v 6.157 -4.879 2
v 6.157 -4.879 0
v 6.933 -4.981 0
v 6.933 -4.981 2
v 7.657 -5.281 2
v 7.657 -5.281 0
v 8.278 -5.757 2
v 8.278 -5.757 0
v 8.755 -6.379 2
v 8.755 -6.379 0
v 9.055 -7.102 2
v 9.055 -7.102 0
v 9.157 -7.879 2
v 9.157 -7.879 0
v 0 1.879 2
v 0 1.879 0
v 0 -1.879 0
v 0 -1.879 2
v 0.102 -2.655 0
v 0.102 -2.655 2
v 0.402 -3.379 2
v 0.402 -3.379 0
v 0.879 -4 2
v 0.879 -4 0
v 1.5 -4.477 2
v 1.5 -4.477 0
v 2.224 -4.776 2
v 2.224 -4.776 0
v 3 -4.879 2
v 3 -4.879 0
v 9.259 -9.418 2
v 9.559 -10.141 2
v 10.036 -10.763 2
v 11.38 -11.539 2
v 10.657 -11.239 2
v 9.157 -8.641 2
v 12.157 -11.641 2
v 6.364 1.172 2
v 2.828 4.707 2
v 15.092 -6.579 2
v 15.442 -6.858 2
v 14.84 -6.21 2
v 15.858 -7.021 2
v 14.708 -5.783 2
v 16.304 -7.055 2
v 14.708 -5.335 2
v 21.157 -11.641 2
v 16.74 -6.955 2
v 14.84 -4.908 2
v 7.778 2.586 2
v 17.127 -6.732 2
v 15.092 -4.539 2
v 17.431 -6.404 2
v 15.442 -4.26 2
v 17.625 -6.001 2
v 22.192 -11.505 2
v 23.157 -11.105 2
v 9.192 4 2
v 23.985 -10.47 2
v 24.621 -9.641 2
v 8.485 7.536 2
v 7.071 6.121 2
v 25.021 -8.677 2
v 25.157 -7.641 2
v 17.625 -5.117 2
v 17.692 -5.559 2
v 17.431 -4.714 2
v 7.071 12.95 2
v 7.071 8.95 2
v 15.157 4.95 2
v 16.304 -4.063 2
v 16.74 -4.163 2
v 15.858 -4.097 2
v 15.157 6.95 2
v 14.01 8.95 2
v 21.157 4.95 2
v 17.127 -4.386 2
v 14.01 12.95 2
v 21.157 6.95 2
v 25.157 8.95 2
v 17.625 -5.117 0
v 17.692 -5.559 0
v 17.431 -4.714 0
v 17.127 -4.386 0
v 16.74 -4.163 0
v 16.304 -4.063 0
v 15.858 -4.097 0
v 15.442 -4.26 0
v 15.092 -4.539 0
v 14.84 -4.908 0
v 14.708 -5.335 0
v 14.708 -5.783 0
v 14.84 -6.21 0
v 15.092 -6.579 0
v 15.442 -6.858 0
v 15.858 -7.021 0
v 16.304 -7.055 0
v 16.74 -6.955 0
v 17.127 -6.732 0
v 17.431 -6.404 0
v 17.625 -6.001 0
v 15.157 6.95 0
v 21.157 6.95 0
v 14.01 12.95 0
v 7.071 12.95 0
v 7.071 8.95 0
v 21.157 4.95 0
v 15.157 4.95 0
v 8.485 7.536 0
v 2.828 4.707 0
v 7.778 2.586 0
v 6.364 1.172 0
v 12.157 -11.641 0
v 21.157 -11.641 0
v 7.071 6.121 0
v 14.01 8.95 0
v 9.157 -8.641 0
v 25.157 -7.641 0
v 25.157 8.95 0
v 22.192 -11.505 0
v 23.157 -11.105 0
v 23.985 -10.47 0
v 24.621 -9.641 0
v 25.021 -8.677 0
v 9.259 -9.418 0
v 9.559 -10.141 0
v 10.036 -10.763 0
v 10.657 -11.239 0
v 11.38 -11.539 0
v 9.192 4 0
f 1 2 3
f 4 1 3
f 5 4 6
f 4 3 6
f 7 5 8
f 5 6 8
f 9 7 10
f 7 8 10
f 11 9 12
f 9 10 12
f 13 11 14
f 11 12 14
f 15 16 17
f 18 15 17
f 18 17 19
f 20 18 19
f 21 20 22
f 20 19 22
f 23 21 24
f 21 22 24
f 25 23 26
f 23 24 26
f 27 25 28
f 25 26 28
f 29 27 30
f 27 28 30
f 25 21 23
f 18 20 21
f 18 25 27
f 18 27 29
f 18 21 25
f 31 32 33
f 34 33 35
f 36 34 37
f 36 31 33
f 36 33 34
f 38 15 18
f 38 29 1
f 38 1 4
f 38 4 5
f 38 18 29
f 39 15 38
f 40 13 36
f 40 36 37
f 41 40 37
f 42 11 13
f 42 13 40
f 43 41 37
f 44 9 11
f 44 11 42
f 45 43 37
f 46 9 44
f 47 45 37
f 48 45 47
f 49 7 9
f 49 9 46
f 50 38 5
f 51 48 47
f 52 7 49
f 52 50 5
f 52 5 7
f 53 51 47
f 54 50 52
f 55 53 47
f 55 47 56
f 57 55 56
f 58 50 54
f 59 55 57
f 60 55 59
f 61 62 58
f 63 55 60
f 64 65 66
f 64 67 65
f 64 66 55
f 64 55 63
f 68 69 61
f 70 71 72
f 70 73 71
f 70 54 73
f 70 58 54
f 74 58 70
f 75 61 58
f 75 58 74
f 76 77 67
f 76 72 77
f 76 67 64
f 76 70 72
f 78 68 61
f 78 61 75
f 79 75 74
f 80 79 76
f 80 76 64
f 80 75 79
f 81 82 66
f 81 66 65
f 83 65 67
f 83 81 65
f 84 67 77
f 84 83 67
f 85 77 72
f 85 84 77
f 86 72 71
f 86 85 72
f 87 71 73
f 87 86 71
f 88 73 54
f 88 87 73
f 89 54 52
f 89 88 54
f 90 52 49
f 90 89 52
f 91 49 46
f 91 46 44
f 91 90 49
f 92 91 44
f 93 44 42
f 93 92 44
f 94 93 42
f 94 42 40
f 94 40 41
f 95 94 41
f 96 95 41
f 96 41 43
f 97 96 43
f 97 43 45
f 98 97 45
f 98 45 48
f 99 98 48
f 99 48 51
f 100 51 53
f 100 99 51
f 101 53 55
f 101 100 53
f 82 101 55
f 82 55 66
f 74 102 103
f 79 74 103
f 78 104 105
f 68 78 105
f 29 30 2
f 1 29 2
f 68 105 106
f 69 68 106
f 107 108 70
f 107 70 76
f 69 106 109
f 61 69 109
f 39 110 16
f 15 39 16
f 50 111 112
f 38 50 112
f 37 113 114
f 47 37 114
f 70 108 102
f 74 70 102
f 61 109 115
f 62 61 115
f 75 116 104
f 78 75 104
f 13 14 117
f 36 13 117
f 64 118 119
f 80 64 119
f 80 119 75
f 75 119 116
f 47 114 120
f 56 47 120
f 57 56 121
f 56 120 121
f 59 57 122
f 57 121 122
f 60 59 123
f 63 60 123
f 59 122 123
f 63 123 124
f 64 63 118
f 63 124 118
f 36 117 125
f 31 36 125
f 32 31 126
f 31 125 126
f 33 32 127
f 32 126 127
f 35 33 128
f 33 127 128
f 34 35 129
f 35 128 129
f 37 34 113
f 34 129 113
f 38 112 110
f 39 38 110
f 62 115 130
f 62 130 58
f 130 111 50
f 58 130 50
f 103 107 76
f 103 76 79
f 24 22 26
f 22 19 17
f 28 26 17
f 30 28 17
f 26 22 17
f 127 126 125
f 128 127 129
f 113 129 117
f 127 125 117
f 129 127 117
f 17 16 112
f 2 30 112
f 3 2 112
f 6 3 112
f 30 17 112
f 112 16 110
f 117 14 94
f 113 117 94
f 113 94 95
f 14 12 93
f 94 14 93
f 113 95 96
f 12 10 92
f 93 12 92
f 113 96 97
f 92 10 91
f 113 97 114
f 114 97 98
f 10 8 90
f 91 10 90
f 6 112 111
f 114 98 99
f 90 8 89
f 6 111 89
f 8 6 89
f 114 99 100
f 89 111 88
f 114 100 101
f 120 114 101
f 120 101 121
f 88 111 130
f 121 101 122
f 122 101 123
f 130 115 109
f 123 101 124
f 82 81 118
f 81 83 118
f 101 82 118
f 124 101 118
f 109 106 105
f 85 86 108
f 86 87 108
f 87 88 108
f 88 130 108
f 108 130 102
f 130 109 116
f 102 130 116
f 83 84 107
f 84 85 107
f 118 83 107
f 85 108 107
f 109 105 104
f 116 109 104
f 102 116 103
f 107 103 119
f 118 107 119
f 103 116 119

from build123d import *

# Parameters (mm, degrees)
MODEL_R             = 1.5
MODEL_W             = 6
MODEL_H             = 2
BOSS_EXTRUDE1_DEPTH = 2
SKETCH15_W          = 2
SKETCH15_H          = 3
CUT_EXTRUDE1_DEPTH  = 2


with BuildPart() as part:
    # Model → Boss-Extrude1 (new body)
    with BuildSketch(Plane.XY):
        with BuildLine():
            Line((6.363961031, 1.171572875), (2.828427125, 4.707106781))
            Line((2.828427125, 4.707106781), (0, 1.878679656))
            Line((0, 1.878679656), (0, -1.878679656))
            ThreePointArc((0, -1.878679656), (0.878679656, -4), (3, -4.878679656))
            Line((3, -4.878679656), (5.828427125, -4.878679656))
            Line((5.828427125, -4.878679656), (6.156854249, -4.878679656))
            ThreePointArc((6.156854249, -4.878679656), (8.278174593, -5.757359313), (9.156854249, -7.878679656))
            Line((9.156854249, -7.878679656), (9.156854249, -8.641362585))
            ThreePointArc((9.156854249, -8.641362585), (10.035533906, -10.762682929), (12.156854249, -11.641362585))
            Line((12.156854249, -11.641362585), (21.156854249, -11.641362585))
            ThreePointArc((21.156854249, -11.641362585), (23.985281374, -10.46978971), (25.156854249, -7.641362585))
            Line((25.156854249, -7.641362585), (25.156854249, 8.949747468))
            Line((25.156854249, 8.949747468), (14.01040764, 8.949747468))
            Line((14.01040764, 8.949747468), (14.01040764, 12.949747468))
            Line((14.01040764, 12.949747468), (7.071067812, 12.949747468))
            Line((7.071067812, 12.949747468), (7.071067812, 8.949747468))
            Line((7.071067812, 8.949747468), (8.485281374, 7.535533906))
            Line((8.485281374, 7.535533906), (5.656854249, 4.707106781))
            Line((5.656854249, 4.707106781), (7.778174593, 2.585786438))
            Line((7.778174593, 2.585786438), (6.363961031, 1.171572875))
        make_face()
        with Locations((16.191687414, -5.558946351)):
            Circle(MODEL_R, mode=Mode.SUBTRACT)
        with Locations((18.156854249, 5.949747468)):
            Rectangle(MODEL_W, MODEL_H, mode=Mode.SUBTRACT)
    extrude(amount=BOSS_EXTRUDE1_DEPTH)

    # Sketch15 → Cut-Extrude1 (cut)
    with BuildSketch(Plane(origin=(5.181980515, 5.181980515, 0), x_dir=(0, 0, 1), z_dir=(-0.707106781, -0.707106781, 0))):
        with Locations((1, -2.171572875)):
            Rectangle(SKETCH15_W, SKETCH15_H)
    extrude(amount=-CUT_EXTRUDE1_DEPTH, mode=Mode.SUBTRACT)


solid = part.part
